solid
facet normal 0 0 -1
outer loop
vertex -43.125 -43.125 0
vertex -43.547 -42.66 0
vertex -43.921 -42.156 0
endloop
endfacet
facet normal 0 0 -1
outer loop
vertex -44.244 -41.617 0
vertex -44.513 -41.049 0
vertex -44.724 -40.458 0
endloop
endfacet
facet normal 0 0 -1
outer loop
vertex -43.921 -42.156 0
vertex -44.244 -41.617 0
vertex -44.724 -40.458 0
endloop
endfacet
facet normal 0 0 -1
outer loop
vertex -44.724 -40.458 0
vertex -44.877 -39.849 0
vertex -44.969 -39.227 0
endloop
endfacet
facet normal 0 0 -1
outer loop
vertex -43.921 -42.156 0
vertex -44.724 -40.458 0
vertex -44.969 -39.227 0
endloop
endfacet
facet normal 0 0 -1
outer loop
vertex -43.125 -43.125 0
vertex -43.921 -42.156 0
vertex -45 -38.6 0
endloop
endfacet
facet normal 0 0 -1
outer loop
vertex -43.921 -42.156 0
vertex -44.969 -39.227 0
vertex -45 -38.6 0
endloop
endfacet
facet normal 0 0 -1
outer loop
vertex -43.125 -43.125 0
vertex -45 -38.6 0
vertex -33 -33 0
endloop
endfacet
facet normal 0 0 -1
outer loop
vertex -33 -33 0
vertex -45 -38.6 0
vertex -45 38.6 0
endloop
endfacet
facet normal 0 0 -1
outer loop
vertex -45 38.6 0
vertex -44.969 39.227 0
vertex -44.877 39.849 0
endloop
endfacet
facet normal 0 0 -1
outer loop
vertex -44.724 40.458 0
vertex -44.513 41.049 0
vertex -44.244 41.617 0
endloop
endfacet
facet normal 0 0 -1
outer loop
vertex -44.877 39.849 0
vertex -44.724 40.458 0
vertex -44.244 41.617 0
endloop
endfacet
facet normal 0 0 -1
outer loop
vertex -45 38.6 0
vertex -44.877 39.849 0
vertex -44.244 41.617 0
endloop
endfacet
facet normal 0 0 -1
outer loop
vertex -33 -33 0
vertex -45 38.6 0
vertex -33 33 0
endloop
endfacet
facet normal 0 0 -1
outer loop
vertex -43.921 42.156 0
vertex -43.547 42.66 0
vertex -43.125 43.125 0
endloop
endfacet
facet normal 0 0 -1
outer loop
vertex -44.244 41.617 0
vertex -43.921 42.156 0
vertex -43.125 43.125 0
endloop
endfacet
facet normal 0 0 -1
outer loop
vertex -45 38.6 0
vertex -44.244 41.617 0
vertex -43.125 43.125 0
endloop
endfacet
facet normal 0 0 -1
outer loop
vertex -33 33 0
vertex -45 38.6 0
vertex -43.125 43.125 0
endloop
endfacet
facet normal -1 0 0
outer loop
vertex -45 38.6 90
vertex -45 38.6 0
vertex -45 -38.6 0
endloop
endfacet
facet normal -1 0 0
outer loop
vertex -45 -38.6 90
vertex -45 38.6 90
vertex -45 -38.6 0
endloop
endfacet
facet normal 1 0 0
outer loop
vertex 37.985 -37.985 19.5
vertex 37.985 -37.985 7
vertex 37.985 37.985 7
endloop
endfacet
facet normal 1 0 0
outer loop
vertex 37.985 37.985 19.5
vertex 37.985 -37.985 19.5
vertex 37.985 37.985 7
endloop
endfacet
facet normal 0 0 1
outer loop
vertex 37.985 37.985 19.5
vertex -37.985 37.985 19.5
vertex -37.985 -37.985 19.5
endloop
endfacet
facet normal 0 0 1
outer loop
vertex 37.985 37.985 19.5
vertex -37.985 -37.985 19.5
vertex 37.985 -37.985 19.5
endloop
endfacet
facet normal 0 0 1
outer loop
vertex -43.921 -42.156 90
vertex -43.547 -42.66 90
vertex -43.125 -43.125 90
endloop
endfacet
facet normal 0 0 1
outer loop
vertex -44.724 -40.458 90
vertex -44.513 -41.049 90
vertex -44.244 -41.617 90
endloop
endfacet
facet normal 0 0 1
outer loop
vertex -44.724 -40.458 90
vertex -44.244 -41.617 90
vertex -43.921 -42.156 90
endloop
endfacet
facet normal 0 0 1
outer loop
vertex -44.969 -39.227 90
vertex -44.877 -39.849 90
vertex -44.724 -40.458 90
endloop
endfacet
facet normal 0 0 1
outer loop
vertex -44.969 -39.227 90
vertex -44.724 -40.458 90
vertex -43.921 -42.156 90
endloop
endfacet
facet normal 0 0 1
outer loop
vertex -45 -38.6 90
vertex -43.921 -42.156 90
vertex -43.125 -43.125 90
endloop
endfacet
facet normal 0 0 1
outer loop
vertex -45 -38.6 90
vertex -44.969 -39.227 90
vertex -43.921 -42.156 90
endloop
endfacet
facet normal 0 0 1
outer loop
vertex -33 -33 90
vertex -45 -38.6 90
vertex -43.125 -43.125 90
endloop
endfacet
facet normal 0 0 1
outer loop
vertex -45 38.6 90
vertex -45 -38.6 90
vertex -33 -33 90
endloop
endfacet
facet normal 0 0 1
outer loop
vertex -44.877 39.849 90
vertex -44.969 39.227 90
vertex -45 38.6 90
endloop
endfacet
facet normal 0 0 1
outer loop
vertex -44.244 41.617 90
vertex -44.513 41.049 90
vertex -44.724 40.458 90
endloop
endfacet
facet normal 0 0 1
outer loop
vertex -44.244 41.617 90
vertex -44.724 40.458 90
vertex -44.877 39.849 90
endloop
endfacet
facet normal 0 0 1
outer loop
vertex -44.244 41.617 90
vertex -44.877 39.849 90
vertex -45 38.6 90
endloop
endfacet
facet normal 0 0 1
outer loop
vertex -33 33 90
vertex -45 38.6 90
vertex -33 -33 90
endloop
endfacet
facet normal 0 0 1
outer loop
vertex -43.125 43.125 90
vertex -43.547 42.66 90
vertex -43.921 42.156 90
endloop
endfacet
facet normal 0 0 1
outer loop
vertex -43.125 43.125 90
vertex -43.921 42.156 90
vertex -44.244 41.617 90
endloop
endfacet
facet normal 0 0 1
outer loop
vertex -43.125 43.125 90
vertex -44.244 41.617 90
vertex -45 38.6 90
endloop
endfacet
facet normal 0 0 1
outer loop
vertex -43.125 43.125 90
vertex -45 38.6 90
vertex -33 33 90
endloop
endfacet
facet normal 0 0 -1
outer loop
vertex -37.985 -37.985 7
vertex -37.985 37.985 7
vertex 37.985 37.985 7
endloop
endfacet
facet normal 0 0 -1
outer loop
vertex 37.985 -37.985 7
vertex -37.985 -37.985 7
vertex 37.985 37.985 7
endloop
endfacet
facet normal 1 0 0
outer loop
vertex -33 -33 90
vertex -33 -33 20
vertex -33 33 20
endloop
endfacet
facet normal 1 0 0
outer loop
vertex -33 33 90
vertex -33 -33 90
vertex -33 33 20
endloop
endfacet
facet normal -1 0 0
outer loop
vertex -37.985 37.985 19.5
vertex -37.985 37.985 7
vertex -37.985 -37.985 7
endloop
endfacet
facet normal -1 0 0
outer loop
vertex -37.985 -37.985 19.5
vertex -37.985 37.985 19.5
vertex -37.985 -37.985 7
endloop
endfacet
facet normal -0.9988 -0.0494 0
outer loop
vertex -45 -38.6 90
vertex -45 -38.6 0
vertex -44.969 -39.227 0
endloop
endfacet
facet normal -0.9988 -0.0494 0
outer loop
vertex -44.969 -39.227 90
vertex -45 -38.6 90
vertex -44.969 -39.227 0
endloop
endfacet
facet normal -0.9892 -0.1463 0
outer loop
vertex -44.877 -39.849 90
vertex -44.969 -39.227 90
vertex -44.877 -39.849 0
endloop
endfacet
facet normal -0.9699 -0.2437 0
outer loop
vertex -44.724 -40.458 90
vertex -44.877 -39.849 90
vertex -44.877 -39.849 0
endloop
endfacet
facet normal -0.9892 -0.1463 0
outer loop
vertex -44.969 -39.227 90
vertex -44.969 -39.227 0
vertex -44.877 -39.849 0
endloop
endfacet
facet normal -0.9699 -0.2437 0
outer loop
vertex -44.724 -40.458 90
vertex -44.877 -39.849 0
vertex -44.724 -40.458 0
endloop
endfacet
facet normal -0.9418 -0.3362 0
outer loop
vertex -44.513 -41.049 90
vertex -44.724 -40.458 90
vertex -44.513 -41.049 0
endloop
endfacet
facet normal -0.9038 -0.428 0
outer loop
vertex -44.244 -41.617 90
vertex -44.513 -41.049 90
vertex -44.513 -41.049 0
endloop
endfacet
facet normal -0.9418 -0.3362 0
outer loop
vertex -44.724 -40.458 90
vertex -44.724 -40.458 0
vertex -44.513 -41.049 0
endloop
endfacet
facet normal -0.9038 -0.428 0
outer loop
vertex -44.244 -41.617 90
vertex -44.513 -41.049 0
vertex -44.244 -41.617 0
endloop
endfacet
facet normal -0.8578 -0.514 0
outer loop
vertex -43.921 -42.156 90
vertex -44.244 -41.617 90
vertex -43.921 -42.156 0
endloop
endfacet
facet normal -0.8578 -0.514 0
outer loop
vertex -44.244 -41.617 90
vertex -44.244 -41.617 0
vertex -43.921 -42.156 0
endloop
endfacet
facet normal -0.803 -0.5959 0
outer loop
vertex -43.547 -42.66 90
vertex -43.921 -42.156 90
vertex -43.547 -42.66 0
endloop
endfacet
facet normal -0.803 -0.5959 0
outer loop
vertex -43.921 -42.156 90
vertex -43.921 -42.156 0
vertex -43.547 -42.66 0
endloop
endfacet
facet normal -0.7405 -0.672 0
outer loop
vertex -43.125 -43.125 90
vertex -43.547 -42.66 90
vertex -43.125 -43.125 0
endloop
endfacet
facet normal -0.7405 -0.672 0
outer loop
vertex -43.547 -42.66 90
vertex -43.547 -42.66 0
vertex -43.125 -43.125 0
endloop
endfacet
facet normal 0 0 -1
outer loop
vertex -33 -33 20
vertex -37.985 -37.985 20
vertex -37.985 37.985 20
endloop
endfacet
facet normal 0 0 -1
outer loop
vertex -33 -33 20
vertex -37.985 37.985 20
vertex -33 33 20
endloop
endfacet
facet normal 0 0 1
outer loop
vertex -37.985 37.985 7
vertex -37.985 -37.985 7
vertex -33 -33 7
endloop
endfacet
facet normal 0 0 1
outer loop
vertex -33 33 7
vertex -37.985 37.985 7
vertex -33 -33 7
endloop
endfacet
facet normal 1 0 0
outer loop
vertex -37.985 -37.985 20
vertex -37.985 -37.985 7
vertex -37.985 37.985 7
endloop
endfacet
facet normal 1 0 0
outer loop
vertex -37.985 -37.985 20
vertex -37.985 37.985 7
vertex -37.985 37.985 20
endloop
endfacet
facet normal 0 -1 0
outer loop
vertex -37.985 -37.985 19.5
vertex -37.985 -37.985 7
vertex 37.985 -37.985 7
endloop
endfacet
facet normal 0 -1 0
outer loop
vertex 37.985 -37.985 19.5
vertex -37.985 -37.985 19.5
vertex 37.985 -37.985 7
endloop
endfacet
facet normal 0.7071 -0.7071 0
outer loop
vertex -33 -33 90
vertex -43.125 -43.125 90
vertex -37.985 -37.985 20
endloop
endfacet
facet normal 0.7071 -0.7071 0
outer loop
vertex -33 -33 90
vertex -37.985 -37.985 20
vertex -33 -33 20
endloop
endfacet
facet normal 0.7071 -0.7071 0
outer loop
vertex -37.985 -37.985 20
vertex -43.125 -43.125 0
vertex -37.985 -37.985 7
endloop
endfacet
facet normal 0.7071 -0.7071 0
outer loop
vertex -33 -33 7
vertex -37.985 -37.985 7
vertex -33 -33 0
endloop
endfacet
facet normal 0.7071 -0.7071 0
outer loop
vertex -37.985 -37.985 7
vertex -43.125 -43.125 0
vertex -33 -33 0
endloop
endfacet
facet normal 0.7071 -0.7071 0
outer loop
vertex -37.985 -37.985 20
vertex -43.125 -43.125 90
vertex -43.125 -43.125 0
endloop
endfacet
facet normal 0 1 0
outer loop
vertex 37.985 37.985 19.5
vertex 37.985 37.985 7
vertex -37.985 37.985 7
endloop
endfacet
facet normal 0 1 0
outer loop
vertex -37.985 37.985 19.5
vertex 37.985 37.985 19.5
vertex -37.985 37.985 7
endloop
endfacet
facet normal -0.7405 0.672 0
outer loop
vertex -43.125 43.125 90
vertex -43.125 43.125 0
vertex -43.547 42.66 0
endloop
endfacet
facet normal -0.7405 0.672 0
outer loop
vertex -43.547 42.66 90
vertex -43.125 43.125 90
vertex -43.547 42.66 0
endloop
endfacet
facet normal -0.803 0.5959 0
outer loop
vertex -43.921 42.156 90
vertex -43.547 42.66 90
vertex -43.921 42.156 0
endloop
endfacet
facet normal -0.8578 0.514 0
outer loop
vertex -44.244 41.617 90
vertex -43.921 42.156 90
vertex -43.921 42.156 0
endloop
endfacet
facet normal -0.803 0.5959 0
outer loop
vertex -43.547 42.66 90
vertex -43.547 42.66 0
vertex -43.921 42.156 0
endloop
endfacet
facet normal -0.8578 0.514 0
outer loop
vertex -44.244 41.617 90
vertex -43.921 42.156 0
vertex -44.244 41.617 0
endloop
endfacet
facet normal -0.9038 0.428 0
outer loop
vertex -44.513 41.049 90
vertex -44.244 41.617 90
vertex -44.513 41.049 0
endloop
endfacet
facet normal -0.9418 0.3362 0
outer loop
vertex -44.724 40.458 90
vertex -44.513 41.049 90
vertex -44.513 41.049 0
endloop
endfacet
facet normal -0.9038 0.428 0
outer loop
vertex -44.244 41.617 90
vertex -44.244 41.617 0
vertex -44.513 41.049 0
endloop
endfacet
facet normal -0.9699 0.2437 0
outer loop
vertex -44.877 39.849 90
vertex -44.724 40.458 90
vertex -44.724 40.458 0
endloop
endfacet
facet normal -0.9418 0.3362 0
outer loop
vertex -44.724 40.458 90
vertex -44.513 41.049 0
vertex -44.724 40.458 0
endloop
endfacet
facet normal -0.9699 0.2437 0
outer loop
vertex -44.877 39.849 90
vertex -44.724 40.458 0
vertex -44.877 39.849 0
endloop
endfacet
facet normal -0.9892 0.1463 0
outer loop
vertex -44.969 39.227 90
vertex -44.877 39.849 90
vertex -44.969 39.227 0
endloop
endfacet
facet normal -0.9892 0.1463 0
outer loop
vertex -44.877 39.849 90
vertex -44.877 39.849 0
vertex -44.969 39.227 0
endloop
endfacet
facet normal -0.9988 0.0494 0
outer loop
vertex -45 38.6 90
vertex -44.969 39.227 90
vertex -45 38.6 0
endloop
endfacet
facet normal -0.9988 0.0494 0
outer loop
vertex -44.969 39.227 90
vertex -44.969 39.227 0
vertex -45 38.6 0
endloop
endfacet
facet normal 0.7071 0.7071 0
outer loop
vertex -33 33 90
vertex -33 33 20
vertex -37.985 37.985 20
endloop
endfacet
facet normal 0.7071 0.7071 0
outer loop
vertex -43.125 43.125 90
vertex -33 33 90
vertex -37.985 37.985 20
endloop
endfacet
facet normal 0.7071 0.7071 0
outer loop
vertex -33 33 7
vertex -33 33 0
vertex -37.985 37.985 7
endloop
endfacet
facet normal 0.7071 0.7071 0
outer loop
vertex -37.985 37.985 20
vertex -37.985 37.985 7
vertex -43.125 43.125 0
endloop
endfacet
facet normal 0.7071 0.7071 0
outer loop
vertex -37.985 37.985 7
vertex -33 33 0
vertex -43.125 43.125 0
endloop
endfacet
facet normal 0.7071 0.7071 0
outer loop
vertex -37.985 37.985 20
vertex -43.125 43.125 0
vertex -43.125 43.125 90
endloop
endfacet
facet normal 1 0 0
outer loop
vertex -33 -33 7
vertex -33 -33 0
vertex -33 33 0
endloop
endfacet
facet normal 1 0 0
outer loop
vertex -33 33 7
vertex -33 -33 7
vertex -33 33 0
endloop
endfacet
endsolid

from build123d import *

# Parameters (mm, degrees)
F1_DEPTH = 90
F2_W     = 5
F2_H     = 13
F3_DEPTH = 44.7
F5_DEPTH = 12.5


with BuildPart() as f1:
    # F0 (on Top) → F1 (new body)
    with BuildSketch(Plane.XY):
        with BuildLine():
            ThreePointArc((-45, -38.6), (-44.512829, -41.049174), (-43.125483, -43.125483))
            Line((-43.125483, -43.125483), (-33, -33))
            Line((-33, -33), (-33, 33))
            Line((-33, 33), (-43.125483, 43.125483))
            ThreePointArc((-43.125483, 43.125483), (-44.512829, 41.049174), (-45, 38.6))
            Line((-45, 38.6), (-45, -38.6))
        make_face()
    extrude(amount=F1_DEPTH)

    # F2 (on Front) → F3 (cut, symmetric)
    with BuildSketch(Plane.XZ):
        with Locations((-35.484573, 13.5)):
            Rectangle(F2_W, F2_H)
    extrude(amount=F3_DEPTH, both=True, mode=Mode.SUBTRACT)


with BuildPart() as f5:
    # F4 (on face) → F5 (new body)
    with BuildSketch(Plane.XY.offset(7)):
        Polygon((-37.984573, 37.984573), (-37.984573, -37.984573), (-33, -33), (-33, 33), align=None)
        Polygon((-33, -33), (-37.984573, -37.984573), (37.984573, -37.984573), (37.984573, 37.984573), (-37.984573, 37.984573), (-33, 33), align=None)
    extrude(amount=F5_DEPTH)


solid = Compound([f1.part, f5.part])
